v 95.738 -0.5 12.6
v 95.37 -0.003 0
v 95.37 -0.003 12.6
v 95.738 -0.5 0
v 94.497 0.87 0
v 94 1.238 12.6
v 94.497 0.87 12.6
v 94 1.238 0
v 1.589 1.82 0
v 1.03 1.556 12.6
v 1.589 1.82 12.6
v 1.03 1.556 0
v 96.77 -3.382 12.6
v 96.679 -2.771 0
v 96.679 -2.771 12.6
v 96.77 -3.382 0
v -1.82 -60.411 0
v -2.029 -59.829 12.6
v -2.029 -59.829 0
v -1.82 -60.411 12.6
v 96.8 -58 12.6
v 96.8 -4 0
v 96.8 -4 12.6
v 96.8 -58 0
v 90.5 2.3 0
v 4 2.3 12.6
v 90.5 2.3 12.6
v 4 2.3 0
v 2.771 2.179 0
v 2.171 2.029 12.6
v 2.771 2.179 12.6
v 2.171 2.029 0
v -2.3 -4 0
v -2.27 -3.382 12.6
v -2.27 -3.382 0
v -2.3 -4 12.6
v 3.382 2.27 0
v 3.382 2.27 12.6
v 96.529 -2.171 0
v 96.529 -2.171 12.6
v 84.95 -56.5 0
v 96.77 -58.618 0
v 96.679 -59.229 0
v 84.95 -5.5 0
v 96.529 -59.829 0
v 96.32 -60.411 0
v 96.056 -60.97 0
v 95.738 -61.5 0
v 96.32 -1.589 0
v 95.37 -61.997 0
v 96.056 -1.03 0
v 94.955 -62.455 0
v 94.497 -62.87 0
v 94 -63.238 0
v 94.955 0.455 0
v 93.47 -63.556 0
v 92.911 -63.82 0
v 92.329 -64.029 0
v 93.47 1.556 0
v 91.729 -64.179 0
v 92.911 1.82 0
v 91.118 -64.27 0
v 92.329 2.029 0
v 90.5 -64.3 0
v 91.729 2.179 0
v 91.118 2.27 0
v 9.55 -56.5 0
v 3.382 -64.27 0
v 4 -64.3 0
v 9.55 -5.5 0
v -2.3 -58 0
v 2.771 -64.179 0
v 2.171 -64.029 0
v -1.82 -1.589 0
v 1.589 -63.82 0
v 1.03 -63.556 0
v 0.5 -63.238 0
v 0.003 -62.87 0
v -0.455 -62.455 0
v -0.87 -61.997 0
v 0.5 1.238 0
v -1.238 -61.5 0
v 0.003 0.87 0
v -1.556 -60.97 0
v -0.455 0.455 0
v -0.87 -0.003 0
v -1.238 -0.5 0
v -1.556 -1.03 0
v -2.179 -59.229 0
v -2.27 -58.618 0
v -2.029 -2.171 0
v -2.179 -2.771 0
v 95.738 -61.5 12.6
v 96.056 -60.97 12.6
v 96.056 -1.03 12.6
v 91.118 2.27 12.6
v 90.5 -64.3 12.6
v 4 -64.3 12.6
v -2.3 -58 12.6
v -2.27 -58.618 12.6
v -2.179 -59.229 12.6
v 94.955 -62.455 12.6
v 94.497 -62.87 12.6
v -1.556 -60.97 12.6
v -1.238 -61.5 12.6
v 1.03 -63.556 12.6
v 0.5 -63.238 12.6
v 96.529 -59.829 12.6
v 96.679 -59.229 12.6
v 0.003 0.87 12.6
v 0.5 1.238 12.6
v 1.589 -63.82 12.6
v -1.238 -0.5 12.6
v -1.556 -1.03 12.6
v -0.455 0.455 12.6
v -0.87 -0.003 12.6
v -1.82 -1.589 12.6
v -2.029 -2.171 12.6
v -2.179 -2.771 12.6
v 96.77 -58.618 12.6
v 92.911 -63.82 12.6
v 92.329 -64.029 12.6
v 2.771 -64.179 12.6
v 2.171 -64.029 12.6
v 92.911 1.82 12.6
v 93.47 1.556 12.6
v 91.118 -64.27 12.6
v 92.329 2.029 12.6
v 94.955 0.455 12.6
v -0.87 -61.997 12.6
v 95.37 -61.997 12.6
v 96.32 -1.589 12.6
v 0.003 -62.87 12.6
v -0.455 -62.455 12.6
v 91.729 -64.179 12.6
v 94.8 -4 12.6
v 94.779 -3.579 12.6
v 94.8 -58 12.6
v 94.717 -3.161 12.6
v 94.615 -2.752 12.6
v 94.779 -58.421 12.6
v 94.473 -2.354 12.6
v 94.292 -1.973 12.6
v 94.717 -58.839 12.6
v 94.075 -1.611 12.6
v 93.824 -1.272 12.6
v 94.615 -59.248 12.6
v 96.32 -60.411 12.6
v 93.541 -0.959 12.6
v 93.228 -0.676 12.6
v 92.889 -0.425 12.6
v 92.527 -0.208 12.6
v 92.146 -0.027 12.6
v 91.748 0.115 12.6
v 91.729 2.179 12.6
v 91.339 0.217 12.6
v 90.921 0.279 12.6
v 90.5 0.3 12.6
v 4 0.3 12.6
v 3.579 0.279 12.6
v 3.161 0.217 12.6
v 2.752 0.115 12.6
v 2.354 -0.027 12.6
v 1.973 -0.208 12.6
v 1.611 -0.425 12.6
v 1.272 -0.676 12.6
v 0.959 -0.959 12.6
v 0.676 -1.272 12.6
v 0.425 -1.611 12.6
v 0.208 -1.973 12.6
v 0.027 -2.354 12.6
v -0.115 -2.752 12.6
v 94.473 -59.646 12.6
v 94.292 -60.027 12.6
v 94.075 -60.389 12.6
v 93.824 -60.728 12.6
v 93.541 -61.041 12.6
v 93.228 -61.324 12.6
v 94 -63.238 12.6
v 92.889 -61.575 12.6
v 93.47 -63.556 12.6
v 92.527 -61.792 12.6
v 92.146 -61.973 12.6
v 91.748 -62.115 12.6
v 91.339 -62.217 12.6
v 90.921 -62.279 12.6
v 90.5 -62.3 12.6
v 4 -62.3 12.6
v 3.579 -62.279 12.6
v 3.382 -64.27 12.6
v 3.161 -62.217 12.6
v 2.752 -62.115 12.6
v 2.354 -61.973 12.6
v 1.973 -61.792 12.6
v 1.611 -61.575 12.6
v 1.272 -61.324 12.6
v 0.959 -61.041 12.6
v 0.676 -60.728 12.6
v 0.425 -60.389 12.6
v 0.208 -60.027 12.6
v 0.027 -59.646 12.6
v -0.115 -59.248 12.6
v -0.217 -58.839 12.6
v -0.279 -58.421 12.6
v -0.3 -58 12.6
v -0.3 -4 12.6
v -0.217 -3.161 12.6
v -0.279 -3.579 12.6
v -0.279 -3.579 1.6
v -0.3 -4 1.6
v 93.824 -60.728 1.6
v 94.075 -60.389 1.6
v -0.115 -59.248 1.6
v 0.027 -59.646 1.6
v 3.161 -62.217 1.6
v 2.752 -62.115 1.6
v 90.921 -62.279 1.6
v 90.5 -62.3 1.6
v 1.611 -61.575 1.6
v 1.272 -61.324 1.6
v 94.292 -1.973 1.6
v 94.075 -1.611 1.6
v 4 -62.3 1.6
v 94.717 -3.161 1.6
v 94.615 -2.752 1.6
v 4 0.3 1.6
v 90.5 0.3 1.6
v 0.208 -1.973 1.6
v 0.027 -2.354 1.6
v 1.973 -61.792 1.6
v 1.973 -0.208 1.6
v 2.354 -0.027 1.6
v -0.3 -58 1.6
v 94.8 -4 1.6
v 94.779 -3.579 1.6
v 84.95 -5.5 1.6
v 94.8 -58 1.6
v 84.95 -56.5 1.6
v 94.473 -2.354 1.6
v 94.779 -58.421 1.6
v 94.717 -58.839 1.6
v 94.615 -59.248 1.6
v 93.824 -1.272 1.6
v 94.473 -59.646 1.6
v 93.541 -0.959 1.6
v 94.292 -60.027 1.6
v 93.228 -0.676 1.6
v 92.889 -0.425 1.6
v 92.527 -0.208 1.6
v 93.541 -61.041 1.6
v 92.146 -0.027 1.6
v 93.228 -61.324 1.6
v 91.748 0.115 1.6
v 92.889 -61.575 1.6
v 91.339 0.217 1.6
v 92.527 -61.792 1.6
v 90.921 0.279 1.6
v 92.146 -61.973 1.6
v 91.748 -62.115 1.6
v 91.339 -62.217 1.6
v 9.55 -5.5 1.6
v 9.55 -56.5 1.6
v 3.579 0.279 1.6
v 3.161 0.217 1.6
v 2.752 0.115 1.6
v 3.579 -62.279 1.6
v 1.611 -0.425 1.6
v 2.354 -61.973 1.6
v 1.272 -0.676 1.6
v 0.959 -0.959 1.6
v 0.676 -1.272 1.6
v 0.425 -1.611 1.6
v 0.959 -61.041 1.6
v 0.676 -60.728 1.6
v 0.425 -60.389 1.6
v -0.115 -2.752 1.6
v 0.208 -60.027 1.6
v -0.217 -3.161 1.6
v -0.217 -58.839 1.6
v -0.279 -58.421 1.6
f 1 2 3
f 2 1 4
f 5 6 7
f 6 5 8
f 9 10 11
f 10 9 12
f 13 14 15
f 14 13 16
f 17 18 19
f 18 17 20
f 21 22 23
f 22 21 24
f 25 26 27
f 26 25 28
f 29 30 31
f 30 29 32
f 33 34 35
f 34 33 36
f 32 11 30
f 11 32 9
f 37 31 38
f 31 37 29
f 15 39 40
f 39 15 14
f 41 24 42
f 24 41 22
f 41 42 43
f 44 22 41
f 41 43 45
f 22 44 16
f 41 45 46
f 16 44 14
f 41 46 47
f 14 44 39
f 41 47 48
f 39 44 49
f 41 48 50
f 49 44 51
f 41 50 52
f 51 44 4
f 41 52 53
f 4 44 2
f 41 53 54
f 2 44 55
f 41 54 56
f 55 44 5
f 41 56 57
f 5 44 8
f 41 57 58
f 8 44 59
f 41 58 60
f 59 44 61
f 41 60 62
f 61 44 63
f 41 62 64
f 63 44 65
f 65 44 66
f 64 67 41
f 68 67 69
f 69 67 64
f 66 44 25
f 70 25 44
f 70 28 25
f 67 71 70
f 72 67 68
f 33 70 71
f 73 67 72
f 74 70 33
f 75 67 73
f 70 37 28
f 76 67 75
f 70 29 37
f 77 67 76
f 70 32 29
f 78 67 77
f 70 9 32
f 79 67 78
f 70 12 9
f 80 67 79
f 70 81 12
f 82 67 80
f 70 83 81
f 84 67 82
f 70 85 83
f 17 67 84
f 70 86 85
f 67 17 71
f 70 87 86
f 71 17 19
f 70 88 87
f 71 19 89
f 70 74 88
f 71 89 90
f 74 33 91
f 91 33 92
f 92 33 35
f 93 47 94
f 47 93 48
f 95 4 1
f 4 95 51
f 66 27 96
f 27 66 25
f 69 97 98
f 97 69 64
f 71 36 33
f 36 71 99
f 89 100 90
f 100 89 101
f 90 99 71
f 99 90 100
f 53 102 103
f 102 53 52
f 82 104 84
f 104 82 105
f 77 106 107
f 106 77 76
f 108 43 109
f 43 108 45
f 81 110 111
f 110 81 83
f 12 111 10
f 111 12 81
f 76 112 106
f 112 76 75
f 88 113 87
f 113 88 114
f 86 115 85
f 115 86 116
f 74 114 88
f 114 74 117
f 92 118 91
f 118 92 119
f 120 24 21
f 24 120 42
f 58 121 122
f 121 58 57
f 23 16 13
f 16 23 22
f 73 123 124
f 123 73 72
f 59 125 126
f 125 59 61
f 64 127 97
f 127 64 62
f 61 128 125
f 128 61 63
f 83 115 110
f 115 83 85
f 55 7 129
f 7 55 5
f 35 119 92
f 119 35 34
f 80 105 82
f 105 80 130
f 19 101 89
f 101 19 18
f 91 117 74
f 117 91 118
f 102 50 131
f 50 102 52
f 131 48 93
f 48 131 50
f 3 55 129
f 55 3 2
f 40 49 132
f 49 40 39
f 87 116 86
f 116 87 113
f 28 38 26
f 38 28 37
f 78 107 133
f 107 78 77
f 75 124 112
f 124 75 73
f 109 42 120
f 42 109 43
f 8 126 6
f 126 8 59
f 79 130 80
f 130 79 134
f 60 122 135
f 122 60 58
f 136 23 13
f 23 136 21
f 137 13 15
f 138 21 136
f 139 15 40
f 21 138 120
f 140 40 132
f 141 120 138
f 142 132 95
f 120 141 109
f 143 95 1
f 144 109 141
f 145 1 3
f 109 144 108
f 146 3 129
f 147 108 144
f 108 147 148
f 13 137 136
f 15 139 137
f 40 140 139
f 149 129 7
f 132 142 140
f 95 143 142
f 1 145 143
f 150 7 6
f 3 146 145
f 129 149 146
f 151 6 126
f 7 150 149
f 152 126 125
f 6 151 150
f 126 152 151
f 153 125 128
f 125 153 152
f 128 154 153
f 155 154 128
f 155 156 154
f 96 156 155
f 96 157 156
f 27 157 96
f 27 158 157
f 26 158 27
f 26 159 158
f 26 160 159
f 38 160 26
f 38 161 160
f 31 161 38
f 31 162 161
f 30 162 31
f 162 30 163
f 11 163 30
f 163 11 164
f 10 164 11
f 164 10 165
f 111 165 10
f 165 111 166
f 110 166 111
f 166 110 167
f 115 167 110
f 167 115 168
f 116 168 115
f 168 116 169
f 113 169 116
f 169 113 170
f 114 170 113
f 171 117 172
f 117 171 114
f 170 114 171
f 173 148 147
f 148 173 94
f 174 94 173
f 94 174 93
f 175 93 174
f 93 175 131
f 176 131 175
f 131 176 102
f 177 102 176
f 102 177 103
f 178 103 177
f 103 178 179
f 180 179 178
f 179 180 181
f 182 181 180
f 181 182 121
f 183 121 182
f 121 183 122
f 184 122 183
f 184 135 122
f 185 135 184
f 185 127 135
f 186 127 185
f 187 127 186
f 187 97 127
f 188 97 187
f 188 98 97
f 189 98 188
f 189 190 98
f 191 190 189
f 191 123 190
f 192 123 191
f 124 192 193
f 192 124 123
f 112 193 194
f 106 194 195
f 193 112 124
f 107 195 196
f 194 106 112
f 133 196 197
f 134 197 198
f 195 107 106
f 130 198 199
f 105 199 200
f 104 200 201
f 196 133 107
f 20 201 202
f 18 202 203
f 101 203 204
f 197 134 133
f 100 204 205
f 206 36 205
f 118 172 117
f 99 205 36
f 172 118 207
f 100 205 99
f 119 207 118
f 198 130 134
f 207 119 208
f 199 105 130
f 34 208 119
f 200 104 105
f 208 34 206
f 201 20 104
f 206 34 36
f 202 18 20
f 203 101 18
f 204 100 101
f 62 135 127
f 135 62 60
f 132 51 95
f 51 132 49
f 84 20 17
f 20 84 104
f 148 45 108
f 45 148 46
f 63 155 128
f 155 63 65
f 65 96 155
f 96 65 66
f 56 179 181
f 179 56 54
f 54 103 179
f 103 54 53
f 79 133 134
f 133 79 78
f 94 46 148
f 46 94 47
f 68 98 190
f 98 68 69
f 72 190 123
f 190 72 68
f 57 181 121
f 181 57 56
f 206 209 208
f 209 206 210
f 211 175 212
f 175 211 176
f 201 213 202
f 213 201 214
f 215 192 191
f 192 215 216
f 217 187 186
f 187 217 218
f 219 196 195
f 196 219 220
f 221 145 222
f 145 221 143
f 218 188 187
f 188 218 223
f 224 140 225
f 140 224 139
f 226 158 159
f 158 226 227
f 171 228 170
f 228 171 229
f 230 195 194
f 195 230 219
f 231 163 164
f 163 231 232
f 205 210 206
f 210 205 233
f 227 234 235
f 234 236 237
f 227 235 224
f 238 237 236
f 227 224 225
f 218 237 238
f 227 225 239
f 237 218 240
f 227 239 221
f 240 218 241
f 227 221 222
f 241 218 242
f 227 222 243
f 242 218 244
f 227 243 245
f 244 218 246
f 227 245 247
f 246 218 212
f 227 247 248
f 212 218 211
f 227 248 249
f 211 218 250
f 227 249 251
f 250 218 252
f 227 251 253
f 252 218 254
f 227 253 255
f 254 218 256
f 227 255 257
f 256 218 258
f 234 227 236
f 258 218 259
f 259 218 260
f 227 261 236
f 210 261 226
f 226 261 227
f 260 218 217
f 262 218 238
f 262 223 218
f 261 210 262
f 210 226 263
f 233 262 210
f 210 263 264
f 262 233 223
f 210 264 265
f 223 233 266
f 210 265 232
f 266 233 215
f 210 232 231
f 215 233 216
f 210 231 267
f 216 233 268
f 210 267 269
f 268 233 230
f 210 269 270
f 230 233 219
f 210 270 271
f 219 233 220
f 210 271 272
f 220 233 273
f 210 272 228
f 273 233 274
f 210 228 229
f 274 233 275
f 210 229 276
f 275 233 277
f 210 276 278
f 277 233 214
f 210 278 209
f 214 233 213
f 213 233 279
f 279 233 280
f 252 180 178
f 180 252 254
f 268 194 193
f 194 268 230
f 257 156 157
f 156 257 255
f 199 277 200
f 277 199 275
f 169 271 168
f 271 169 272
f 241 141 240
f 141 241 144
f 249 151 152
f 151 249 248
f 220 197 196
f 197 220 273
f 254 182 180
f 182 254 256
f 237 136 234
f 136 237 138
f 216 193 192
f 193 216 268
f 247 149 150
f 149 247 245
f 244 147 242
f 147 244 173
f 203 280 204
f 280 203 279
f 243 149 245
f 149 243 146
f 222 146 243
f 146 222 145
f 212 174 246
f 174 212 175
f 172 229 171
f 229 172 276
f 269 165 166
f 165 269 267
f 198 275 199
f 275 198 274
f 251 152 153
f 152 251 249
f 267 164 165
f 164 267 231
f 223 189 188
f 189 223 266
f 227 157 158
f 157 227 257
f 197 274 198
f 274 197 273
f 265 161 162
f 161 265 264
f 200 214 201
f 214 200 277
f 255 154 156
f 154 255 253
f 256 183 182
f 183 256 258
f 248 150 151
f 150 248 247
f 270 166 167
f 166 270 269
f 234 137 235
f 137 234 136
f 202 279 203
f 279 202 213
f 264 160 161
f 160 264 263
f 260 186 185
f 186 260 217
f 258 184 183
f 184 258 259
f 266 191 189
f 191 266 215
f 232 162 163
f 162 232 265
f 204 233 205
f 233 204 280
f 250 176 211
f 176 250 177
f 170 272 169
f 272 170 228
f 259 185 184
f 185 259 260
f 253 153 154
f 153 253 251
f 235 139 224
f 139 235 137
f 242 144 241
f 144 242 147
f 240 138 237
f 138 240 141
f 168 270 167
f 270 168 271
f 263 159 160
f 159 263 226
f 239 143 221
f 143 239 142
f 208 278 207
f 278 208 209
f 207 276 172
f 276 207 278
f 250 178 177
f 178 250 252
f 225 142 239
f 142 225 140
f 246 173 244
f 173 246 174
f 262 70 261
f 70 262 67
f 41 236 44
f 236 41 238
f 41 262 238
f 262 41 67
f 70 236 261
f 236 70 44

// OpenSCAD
// file: parametros.scad
// parametros.scad — TODAS as medidas da case modular da JC3248W535.
// Os outros arquivos só usam o que está aqui. Para ajustar depois de um teste, mude aqui.
//
// ETIQUETAS (leia antes de imprimir para valer):
//   [NET]  número publicado (fabricante ou vendedor; fonte ao lado). Conferir no paquímetro.
//   [PDF~] estimado medindo os pixels do desenho do PDF da Guition. Erro de ~±1 mm.
//   [SUP]  suposição sem fonte nenhuma. A MEDIR.
//   [PROJ] decisão de projeto: pode mudar à vontade.
//
// PDF da Guition: https://done.land/assets/files/jc3248w535%20specifications-en.pdf
//   pág. 4 (tabela) e 6 (desenho): módulo 94,5 x 62,0 mm, área visível 73,4 x 49,0 mm.
//   pág. 5: vista traseira com os conectores. As posições [PDF~] vêm dela
//   (escala: 504 px = 94,5 mm, ou seja, 5,33 px/mm).
//
// COORDENADAS (iguais em todos os arquivos):
//   X, Y = placa vista POR TRÁS, como na pág. 5 do PDF: USB-C à direita, origem no
//          canto inferior esquerdo da placa.
//   Z    = para cima, na direção da tela. Z = 0 é a face externa da tampa traseira.

$fn = $preview ? 32 : 64;

// ---------------- Impressão [PROJ] ----------------
folga        = 0.30;  // entre a placa e a moldura, por lado
folga_trilho = 0.25;  // rabo de andorinha, por lado: escolher com teste_encaixe.scad
parede       = 2.0;   // parede lateral (5 linhas de bico 0,4)
esp_min      = 1.6;   // pisos e tetos finos (8 camadas de 0,2 mm)

// ---------------- Placa JC3248W535 ----------------
placa_c = 94.5;   // [NET] PDF: "Module size 94.5*62.0(mm)"
placa_l = 62.0;   // [NET] idem
placa_e = 11.0;   // [SUP] ESPESSURA TOTAL (vidro até as costas). Nenhuma fonte dá. A MEDIR
placa_r = 4.0;    // [SUP] raio dos cantos
tela_c  = 73.4;   // [NET] PDF: "Effective display area 73.4*49.0(mm)"
tela_l  = 49.0;   // [NET]
tela_dx = 0;      // [SUP] deslocamento do centro da tela (no PDF parece centrada)
tela_dy = 0;      // [SUP]
tela_margem = 1.0; // [PROJ] abertura da moldura maior que a área visível, por lado

// Furos dos 4 cantos (nas costas)
furo_mx = 5.0;    // [PDF~] da borda ao centro do furo, em X (pixels: 5,1 e 5,0)
furo_my = 5.0;    // [PDF~] idem em Y (pixels: 5,3 e 4,9)
parafuso_furo  = 2.4;  // [SUP] passagem para M2. Nem a rosca dos furos é conhecida
parafuso_cab_d = 4.6;  // [SUP] cabeça de M2 + folga
parafuso_cab_h = 1.8;  // [SUP]

// Conectores e botões nas costas (pág. 5 do PDF)
// [nome, centro x, centro y, janela x, janela y, peça x, peça y]
//   centro e peça = [PDF~]; janela = peça + espaço para o plugue/dedo = [SUP]
conectores = [
  ["P5 bateria",    70.4, 55.2,  9,  7,  3.6,  3.7],
  ["chave bateria", 77.9, 55.5,  5,  5,  2.0,  2.0],
  ["USB-C",         82.6, 36.0,  9, 14,  5.6, 10.7], // janela = capa do plugue do cabo [SUP]
  ["P1",            82.0, 25.9,  7, 13,  4.0,  9.8],
  ["P4 QWIIC",      17.6,  6.9, 11,  7,  7.5,  3.8],
  ["P3",            29.1,  6.9, 11,  7,  7.9,  3.8],
  ["P2",            51.4,  6.9, 16,  7, 12.2,  3.8],
  ["P6 som",        69.4,  6.9,  9,  7,  5.4,  3.8],
  ["Boot/Reset",    12.2, 12.9,  9,  5,  6.0,  2.0],
];
// microSD: não aparece no PDF (deve ficar numa borda). Fica sem recorte até medir.

// ---------------- Case base [PROJ] ----------------
folga_tras = 4.0;  // [SUP] vão entre as costas da placa e a tampa (torres + fio interno)
esp_frente = 1.6;  // borda da moldura por cima da tela
torre_d    = 6.5;  // torres dos parafusos

// Trilho rabo de andorinha (macho no módulo, fêmea na tampa)
trilho_base = 8.0;  // largura do macho na base
trilho_h    = 3.0;  // altura
trilho_ang  = 30;   // flanco em relação à vertical (<= 45 imprime sem suporte)
trilho_y    = 31.0; // centro do trilho em Y (meio da placa)
trilho_fim  = 75.0; // batente, antes da área do USB-C/P1
// Trava de pressão: calombo no macho, covinha no teto da fêmea
trava_altura = 0.4; // quanto o calombo sobe acima do trilho: testar
trava_r      = 1.2;
trava_recuo  = 6;   // distância do batente até a trava

// Área que um módulo ocupa nas costas (livra P5 em cima e a fileira de baixo)
mod_y0 = 11.0;
mod_y1 = 51.0;
mod_r  = 2.0;

// Porta do módulo: abertura em posição FIXA, igual em todos os módulos
porta_x = 68;
porta_y = 44;
porta_c = 12;  // [SUP] tamanho de um conector magnético pogo de 2 pinos: trocar pela peça
porta_l = 6;

// ---------------- Baterias ----------------
// [nome, comprimento, largura, espessura]: [NET] da etiqueta/INVENTARIO
baterias = [
  ["JBL GSP383562",  62, 35, 3.8],
  ["Rontek 903048",  48, 30, 9.0],
];
folga_bat = 0.5;   // [PROJ] LiPo incha um pouco: folga generosa
baia_c    = 11;    // [SUP] espaço para o adaptador (conector original -> 2 fios)

// ---------------- NRF24L01 PA+LNA ----------------
nrf_c   = 41.0;  // [NET] vendedores dão 37 a 45,5 mm, sem o SMA. A MEDIR
nrf_l   = 15.5;  // [NET] idem 15 a 16,6
nrf_e   = 1.6;   // [SUP] espessura da placa
nrf_prof = 12;   // [SUP] altura interna (componentes + pinos + capacitor)
sma_d   = 6.8;   // [PROJ] rosca SMA = 1/4" (6,35 mm) + folga
sma_z   = 4.0;   // [SUP] centro do SMA acima do fundo da cavidade

// ---------------- Derivados (não mexer) ----------------
ext      = folga + parede;                          // borda da placa -> face externa
ext_r    = placa_r + ext;
trilho_topo = trilho_base + 2 * trilho_h * tan(trilho_ang);
esp_tras = trilho_h + folga_trilho + esp_min;       // laje da tampa
z_placa  = esp_tras + folga_tras;                   // costas da placa
z_topo   = z_placa + placa_e + esp_frente;          // frente da moldura
mod_x0   = -ext;                                    // módulo rente à borda da case
mod_x1   = trilho_fim;
furos = [[furo_mx, furo_my], [placa_c - furo_mx, furo_my],
         [furo_mx, placa_l - furo_my], [placa_c - furo_mx, placa_l - furo_my]];
// main file
// case_base.scad: peças da case base já na posição de IMPRESSÃO.
// Exportar: openscad -D 'peca="moldura"' -o moldura.stl case_base.scad
//   moldura: frente da tela virada para a mesa. Sem suporte.
//   tampa:   face externa (com o canal do trilho) na mesa. O teto do canal é uma
//            ponte de ~12 mm: sem suporte.
include <pecas.scad>

peca = "moldura"; // [moldura, tampa]

if (peca == "moldura") translate([0, 0, z_topo]) rotate([180, 0, 0]) moldura();
if (peca == "tampa") tampa();
